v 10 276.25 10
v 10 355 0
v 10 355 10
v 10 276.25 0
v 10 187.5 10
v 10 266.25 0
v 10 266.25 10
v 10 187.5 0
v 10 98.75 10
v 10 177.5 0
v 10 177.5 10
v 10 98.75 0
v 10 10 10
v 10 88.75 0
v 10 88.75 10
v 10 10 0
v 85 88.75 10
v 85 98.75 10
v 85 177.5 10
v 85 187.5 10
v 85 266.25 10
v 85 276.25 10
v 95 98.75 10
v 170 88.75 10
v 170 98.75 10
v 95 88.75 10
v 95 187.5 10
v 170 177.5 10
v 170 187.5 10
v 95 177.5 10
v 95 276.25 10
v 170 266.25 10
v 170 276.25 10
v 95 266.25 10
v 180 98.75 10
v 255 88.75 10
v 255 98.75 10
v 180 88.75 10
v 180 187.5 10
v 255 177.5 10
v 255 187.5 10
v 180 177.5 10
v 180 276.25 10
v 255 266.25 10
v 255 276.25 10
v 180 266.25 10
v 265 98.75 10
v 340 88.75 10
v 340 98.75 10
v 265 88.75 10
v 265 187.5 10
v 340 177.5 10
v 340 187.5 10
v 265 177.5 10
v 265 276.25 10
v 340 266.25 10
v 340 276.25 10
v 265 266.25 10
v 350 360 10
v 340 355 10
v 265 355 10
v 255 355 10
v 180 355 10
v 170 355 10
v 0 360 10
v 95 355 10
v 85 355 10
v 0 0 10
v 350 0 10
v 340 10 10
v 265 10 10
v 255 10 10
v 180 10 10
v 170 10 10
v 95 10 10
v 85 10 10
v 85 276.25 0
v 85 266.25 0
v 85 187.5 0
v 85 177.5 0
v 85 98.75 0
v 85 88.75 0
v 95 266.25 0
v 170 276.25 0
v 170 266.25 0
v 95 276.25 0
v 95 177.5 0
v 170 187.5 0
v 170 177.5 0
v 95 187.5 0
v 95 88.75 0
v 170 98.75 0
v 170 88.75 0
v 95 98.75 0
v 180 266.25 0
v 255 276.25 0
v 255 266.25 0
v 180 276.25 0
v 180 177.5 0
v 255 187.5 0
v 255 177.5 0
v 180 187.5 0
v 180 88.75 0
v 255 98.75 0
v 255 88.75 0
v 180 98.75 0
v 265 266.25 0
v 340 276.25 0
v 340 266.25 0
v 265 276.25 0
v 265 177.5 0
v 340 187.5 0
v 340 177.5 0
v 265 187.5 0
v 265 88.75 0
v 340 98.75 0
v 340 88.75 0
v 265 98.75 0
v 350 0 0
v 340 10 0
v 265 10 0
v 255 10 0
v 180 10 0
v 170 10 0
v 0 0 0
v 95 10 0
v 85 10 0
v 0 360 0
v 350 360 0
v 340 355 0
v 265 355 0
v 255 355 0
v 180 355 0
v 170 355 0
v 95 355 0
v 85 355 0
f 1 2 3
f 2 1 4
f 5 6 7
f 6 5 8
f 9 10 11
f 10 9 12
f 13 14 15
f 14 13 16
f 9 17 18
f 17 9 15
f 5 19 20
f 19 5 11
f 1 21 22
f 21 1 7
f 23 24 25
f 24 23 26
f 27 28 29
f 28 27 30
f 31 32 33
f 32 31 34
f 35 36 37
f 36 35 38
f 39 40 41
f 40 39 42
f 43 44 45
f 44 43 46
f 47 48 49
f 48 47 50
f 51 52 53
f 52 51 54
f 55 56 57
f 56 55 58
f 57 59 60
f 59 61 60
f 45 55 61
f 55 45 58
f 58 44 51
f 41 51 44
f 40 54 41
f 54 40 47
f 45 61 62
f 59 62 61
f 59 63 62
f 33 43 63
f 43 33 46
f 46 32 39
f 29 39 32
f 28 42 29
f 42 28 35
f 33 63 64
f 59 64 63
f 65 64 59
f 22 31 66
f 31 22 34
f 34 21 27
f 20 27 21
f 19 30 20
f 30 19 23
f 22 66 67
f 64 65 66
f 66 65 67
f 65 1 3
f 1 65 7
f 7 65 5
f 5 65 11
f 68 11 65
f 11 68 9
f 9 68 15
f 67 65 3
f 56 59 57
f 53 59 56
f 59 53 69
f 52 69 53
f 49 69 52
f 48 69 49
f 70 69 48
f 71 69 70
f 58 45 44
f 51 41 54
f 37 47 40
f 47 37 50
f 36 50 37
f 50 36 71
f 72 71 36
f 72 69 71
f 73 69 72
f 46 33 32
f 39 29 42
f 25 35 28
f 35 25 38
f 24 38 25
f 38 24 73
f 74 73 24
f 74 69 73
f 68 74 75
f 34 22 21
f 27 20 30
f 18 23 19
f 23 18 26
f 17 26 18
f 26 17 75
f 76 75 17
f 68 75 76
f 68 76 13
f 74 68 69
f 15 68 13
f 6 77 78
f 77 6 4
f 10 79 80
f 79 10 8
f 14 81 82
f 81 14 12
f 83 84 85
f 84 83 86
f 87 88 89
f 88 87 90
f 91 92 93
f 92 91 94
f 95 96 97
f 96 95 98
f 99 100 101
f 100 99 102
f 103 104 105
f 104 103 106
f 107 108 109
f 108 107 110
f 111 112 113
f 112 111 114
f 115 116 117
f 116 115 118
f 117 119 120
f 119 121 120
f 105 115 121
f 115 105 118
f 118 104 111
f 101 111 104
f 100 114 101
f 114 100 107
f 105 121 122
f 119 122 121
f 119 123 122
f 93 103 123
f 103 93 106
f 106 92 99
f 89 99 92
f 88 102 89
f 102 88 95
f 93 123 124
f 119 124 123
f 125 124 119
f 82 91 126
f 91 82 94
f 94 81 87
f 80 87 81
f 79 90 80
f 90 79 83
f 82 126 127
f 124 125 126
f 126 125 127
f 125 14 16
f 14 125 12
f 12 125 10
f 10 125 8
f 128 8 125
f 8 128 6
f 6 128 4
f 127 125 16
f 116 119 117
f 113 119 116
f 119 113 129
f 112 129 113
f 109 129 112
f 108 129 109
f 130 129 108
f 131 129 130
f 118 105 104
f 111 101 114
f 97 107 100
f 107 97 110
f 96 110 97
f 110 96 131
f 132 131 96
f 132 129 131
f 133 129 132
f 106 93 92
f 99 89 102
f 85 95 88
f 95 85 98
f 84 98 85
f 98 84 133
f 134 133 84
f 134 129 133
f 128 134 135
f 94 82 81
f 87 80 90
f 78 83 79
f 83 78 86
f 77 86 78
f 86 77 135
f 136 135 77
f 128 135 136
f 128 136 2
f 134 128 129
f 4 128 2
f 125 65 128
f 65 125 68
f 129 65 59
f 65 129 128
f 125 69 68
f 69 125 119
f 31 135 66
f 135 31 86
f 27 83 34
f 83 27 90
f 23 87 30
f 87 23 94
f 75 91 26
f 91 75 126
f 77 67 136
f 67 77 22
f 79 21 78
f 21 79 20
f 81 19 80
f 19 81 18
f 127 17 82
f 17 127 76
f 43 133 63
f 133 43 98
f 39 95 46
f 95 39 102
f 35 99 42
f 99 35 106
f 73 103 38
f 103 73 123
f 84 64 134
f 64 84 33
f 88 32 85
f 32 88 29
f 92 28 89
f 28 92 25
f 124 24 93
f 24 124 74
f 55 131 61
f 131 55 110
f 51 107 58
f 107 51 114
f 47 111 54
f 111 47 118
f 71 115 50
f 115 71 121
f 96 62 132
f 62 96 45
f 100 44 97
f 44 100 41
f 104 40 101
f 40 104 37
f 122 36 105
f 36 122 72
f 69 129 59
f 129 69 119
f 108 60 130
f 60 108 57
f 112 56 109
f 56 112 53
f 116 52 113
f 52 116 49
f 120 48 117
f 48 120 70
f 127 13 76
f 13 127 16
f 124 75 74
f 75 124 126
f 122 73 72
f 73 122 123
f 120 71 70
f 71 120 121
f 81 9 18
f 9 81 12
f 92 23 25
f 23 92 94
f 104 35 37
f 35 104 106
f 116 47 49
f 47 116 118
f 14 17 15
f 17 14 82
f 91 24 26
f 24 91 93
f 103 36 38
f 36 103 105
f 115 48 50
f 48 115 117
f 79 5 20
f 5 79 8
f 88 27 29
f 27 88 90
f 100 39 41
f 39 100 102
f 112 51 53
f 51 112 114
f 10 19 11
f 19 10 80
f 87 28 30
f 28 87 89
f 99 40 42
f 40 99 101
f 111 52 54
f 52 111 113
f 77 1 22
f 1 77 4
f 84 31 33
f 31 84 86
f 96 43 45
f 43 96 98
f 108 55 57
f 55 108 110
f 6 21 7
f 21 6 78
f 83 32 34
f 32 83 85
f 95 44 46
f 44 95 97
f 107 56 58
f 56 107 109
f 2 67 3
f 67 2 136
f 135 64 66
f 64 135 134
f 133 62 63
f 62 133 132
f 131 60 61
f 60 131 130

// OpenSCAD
// face_band.scad reused for left face lower band (thickness toward negative X)

width = 350;
band_h = 360;
thk = 10;
full_height = 720;
h_bar_count = 9;
h_gap = (full_height - h_bar_count * thk) / (h_bar_count - 1);
v_gap_count = 4;
v_bars = v_gap_count + 1;
v_gap = (width - v_bars * thk) / v_gap_count;
$fn = 32;

module face_band(w=width, bh=band_h, t=thk) {
    union() {
        for (i = [0 : v_bars - 1]) {
            x = i * (t + v_gap);
            translate([x, 0, 0]) cube([t, bh, t]);
        }
        for (j = [0 : h_bar_count - 1]) {
            y_full = j * (t + h_gap);
            if (y_full < bh && (y_full + t) > 0) {
                intersection() {
                    translate([0, y_full, 0]) cube([w, t, t]);
                    translate([0, 0, 0]) cube([w, bh, t]);
                }
            }
        }
    }
}

face_band();
